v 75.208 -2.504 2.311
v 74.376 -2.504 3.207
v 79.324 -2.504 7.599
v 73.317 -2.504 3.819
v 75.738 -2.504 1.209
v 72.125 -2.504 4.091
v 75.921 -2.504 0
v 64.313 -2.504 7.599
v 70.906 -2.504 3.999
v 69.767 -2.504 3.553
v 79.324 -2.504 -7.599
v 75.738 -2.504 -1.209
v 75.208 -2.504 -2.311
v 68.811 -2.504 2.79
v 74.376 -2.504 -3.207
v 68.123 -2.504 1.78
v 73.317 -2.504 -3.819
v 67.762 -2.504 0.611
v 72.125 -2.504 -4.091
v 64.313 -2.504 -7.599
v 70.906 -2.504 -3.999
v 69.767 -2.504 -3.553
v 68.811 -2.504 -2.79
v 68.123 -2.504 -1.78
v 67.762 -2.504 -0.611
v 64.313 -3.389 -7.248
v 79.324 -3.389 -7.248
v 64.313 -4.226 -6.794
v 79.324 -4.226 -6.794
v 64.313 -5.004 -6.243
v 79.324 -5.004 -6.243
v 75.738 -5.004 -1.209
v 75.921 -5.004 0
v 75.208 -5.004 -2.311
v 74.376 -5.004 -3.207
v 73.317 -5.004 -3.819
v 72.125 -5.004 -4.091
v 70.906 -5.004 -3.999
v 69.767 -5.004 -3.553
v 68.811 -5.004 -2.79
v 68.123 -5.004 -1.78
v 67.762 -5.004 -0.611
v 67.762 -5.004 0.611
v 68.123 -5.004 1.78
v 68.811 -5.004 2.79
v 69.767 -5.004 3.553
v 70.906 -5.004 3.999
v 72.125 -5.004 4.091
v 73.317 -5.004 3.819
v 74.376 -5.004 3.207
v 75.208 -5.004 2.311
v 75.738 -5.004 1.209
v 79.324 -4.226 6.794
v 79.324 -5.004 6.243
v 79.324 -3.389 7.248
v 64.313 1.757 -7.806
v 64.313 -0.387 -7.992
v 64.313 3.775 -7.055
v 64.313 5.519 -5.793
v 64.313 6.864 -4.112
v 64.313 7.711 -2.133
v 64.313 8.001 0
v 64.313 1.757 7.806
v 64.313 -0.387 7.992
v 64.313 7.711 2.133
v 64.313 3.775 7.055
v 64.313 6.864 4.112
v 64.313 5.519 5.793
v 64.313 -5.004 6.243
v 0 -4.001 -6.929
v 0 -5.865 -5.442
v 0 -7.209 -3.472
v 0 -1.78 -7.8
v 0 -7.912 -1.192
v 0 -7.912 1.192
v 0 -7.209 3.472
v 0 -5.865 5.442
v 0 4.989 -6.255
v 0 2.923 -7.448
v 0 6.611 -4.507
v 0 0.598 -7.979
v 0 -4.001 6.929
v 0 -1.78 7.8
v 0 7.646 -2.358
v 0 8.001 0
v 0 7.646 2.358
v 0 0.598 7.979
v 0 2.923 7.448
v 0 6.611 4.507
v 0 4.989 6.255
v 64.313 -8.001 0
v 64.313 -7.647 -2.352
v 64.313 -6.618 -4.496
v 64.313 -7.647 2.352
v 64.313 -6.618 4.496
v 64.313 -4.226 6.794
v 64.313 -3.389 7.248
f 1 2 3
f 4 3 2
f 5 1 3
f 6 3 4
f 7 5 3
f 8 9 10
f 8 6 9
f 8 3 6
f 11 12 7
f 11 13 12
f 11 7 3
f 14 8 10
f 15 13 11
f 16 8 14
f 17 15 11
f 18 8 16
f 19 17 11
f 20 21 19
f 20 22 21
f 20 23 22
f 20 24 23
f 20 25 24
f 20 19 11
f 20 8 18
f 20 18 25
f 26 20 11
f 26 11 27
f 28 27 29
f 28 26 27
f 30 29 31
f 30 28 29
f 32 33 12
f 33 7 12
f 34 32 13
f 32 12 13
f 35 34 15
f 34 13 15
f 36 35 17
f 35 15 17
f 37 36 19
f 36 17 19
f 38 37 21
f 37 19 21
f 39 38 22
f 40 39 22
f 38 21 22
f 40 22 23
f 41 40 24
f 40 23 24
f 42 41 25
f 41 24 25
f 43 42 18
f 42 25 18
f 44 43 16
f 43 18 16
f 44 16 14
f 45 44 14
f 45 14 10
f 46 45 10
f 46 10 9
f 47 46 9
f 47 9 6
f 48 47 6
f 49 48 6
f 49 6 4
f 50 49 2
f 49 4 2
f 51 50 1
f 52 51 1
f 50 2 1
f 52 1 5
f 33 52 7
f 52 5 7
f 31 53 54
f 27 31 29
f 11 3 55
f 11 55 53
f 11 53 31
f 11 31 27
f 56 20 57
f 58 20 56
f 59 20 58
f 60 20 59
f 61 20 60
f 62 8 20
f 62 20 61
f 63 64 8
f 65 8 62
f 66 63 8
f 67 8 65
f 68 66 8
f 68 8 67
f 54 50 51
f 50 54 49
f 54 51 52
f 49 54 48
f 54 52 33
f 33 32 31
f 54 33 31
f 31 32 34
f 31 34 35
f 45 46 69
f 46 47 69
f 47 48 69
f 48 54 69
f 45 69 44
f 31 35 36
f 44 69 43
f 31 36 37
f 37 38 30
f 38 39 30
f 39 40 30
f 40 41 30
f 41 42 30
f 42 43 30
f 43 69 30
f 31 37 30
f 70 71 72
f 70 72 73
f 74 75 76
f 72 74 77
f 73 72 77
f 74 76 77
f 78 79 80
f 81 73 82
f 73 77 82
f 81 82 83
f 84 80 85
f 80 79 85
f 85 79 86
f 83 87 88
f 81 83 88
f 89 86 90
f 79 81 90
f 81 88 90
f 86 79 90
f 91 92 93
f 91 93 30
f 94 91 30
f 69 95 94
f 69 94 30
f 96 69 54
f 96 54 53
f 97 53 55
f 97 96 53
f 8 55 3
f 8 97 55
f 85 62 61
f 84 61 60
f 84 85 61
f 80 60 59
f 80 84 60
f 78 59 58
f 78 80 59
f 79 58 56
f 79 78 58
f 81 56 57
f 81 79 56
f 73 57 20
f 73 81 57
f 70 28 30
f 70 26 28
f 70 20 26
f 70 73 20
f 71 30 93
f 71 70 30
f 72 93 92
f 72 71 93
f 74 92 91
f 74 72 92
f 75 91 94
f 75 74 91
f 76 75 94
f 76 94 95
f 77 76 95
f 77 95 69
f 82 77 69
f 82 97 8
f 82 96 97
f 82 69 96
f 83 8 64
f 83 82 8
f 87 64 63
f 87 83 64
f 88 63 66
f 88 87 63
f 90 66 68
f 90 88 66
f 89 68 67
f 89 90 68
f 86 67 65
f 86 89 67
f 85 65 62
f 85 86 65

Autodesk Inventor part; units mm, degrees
ref_plane "YZ Plane" through (0, 0, 0) normal (1, 0, 0) x (0, 1, 0)
ref_plane "XZ Plane" through (0, 0, 0) normal (0, 1, 0) x (-1, 0, 0)
ref_plane "XY Plane" through (0, 0, 0) normal (0, 0, 1) x (1, 0, 0)
sketch "Sketch1" plane through (0, 0, 0) normal (1, 0, 0) x (0, 1, 0)
  circle A0 centre (0, 0) radius 8.001
  dimension "d0" = 16.002
extrude "Extrusion1" add sketch "Sketch1" along normal blind 64.3128
sketch "Sketch2" plane through (64.3128, 0, 0) normal (1, 0, 0) x (0, 0, -1)
  line L0 (-6.2432, -5.0038) -> (6.2432, -5.0038)
  line L1 (-7.5991, -2.5038) -> (7.5991, -2.5038)
  arc A0 (6.2432, -5.0038) -> (7.5991, -2.5038) centre (0, 0) ccw
  arc A1 (-7.5991, -2.5038) -> (-6.2432, -5.0038) centre (0, 0) ccw
  circle A2 centre (0, 0) radius 8.001 projected
  point P0 (7.0332, -3.8145)
  point P1 (-7.0332, -3.8145)
  dimension "d3" = 5.0038
  dimension "d4" = 2.5
extrude "Extrusion2" add sketch "Sketch2" along normal blind 15.0114 contours A1 L1 A0 L0
sketch "Sketch3" plane through (64.3128, -2.5038, 7.5991) normal (0, 1, 0) x (1, 0, 0)
  circle A0 centre (7.5057, 7.5991) radius 4.1021
  line L0 (0, 15.1983) -> (15.0114, 15.1983) projected
  line L1 (0, 0) -> (15.0114, 0) projected
  point P0 (-64.3128, 7.5991)
  point P1 (7.5057, 15.1983)
  dimension "d8" = 8.2042
  dimension "d9" = 7.5991
  dimension "d10" = 15.1983
extrude "Extrusion3" cut sketch "Sketch3" against normal blind 15.0114
equation "\"d9\" = 0.5 * d10"
properties part number "Ring Connector model 2"
